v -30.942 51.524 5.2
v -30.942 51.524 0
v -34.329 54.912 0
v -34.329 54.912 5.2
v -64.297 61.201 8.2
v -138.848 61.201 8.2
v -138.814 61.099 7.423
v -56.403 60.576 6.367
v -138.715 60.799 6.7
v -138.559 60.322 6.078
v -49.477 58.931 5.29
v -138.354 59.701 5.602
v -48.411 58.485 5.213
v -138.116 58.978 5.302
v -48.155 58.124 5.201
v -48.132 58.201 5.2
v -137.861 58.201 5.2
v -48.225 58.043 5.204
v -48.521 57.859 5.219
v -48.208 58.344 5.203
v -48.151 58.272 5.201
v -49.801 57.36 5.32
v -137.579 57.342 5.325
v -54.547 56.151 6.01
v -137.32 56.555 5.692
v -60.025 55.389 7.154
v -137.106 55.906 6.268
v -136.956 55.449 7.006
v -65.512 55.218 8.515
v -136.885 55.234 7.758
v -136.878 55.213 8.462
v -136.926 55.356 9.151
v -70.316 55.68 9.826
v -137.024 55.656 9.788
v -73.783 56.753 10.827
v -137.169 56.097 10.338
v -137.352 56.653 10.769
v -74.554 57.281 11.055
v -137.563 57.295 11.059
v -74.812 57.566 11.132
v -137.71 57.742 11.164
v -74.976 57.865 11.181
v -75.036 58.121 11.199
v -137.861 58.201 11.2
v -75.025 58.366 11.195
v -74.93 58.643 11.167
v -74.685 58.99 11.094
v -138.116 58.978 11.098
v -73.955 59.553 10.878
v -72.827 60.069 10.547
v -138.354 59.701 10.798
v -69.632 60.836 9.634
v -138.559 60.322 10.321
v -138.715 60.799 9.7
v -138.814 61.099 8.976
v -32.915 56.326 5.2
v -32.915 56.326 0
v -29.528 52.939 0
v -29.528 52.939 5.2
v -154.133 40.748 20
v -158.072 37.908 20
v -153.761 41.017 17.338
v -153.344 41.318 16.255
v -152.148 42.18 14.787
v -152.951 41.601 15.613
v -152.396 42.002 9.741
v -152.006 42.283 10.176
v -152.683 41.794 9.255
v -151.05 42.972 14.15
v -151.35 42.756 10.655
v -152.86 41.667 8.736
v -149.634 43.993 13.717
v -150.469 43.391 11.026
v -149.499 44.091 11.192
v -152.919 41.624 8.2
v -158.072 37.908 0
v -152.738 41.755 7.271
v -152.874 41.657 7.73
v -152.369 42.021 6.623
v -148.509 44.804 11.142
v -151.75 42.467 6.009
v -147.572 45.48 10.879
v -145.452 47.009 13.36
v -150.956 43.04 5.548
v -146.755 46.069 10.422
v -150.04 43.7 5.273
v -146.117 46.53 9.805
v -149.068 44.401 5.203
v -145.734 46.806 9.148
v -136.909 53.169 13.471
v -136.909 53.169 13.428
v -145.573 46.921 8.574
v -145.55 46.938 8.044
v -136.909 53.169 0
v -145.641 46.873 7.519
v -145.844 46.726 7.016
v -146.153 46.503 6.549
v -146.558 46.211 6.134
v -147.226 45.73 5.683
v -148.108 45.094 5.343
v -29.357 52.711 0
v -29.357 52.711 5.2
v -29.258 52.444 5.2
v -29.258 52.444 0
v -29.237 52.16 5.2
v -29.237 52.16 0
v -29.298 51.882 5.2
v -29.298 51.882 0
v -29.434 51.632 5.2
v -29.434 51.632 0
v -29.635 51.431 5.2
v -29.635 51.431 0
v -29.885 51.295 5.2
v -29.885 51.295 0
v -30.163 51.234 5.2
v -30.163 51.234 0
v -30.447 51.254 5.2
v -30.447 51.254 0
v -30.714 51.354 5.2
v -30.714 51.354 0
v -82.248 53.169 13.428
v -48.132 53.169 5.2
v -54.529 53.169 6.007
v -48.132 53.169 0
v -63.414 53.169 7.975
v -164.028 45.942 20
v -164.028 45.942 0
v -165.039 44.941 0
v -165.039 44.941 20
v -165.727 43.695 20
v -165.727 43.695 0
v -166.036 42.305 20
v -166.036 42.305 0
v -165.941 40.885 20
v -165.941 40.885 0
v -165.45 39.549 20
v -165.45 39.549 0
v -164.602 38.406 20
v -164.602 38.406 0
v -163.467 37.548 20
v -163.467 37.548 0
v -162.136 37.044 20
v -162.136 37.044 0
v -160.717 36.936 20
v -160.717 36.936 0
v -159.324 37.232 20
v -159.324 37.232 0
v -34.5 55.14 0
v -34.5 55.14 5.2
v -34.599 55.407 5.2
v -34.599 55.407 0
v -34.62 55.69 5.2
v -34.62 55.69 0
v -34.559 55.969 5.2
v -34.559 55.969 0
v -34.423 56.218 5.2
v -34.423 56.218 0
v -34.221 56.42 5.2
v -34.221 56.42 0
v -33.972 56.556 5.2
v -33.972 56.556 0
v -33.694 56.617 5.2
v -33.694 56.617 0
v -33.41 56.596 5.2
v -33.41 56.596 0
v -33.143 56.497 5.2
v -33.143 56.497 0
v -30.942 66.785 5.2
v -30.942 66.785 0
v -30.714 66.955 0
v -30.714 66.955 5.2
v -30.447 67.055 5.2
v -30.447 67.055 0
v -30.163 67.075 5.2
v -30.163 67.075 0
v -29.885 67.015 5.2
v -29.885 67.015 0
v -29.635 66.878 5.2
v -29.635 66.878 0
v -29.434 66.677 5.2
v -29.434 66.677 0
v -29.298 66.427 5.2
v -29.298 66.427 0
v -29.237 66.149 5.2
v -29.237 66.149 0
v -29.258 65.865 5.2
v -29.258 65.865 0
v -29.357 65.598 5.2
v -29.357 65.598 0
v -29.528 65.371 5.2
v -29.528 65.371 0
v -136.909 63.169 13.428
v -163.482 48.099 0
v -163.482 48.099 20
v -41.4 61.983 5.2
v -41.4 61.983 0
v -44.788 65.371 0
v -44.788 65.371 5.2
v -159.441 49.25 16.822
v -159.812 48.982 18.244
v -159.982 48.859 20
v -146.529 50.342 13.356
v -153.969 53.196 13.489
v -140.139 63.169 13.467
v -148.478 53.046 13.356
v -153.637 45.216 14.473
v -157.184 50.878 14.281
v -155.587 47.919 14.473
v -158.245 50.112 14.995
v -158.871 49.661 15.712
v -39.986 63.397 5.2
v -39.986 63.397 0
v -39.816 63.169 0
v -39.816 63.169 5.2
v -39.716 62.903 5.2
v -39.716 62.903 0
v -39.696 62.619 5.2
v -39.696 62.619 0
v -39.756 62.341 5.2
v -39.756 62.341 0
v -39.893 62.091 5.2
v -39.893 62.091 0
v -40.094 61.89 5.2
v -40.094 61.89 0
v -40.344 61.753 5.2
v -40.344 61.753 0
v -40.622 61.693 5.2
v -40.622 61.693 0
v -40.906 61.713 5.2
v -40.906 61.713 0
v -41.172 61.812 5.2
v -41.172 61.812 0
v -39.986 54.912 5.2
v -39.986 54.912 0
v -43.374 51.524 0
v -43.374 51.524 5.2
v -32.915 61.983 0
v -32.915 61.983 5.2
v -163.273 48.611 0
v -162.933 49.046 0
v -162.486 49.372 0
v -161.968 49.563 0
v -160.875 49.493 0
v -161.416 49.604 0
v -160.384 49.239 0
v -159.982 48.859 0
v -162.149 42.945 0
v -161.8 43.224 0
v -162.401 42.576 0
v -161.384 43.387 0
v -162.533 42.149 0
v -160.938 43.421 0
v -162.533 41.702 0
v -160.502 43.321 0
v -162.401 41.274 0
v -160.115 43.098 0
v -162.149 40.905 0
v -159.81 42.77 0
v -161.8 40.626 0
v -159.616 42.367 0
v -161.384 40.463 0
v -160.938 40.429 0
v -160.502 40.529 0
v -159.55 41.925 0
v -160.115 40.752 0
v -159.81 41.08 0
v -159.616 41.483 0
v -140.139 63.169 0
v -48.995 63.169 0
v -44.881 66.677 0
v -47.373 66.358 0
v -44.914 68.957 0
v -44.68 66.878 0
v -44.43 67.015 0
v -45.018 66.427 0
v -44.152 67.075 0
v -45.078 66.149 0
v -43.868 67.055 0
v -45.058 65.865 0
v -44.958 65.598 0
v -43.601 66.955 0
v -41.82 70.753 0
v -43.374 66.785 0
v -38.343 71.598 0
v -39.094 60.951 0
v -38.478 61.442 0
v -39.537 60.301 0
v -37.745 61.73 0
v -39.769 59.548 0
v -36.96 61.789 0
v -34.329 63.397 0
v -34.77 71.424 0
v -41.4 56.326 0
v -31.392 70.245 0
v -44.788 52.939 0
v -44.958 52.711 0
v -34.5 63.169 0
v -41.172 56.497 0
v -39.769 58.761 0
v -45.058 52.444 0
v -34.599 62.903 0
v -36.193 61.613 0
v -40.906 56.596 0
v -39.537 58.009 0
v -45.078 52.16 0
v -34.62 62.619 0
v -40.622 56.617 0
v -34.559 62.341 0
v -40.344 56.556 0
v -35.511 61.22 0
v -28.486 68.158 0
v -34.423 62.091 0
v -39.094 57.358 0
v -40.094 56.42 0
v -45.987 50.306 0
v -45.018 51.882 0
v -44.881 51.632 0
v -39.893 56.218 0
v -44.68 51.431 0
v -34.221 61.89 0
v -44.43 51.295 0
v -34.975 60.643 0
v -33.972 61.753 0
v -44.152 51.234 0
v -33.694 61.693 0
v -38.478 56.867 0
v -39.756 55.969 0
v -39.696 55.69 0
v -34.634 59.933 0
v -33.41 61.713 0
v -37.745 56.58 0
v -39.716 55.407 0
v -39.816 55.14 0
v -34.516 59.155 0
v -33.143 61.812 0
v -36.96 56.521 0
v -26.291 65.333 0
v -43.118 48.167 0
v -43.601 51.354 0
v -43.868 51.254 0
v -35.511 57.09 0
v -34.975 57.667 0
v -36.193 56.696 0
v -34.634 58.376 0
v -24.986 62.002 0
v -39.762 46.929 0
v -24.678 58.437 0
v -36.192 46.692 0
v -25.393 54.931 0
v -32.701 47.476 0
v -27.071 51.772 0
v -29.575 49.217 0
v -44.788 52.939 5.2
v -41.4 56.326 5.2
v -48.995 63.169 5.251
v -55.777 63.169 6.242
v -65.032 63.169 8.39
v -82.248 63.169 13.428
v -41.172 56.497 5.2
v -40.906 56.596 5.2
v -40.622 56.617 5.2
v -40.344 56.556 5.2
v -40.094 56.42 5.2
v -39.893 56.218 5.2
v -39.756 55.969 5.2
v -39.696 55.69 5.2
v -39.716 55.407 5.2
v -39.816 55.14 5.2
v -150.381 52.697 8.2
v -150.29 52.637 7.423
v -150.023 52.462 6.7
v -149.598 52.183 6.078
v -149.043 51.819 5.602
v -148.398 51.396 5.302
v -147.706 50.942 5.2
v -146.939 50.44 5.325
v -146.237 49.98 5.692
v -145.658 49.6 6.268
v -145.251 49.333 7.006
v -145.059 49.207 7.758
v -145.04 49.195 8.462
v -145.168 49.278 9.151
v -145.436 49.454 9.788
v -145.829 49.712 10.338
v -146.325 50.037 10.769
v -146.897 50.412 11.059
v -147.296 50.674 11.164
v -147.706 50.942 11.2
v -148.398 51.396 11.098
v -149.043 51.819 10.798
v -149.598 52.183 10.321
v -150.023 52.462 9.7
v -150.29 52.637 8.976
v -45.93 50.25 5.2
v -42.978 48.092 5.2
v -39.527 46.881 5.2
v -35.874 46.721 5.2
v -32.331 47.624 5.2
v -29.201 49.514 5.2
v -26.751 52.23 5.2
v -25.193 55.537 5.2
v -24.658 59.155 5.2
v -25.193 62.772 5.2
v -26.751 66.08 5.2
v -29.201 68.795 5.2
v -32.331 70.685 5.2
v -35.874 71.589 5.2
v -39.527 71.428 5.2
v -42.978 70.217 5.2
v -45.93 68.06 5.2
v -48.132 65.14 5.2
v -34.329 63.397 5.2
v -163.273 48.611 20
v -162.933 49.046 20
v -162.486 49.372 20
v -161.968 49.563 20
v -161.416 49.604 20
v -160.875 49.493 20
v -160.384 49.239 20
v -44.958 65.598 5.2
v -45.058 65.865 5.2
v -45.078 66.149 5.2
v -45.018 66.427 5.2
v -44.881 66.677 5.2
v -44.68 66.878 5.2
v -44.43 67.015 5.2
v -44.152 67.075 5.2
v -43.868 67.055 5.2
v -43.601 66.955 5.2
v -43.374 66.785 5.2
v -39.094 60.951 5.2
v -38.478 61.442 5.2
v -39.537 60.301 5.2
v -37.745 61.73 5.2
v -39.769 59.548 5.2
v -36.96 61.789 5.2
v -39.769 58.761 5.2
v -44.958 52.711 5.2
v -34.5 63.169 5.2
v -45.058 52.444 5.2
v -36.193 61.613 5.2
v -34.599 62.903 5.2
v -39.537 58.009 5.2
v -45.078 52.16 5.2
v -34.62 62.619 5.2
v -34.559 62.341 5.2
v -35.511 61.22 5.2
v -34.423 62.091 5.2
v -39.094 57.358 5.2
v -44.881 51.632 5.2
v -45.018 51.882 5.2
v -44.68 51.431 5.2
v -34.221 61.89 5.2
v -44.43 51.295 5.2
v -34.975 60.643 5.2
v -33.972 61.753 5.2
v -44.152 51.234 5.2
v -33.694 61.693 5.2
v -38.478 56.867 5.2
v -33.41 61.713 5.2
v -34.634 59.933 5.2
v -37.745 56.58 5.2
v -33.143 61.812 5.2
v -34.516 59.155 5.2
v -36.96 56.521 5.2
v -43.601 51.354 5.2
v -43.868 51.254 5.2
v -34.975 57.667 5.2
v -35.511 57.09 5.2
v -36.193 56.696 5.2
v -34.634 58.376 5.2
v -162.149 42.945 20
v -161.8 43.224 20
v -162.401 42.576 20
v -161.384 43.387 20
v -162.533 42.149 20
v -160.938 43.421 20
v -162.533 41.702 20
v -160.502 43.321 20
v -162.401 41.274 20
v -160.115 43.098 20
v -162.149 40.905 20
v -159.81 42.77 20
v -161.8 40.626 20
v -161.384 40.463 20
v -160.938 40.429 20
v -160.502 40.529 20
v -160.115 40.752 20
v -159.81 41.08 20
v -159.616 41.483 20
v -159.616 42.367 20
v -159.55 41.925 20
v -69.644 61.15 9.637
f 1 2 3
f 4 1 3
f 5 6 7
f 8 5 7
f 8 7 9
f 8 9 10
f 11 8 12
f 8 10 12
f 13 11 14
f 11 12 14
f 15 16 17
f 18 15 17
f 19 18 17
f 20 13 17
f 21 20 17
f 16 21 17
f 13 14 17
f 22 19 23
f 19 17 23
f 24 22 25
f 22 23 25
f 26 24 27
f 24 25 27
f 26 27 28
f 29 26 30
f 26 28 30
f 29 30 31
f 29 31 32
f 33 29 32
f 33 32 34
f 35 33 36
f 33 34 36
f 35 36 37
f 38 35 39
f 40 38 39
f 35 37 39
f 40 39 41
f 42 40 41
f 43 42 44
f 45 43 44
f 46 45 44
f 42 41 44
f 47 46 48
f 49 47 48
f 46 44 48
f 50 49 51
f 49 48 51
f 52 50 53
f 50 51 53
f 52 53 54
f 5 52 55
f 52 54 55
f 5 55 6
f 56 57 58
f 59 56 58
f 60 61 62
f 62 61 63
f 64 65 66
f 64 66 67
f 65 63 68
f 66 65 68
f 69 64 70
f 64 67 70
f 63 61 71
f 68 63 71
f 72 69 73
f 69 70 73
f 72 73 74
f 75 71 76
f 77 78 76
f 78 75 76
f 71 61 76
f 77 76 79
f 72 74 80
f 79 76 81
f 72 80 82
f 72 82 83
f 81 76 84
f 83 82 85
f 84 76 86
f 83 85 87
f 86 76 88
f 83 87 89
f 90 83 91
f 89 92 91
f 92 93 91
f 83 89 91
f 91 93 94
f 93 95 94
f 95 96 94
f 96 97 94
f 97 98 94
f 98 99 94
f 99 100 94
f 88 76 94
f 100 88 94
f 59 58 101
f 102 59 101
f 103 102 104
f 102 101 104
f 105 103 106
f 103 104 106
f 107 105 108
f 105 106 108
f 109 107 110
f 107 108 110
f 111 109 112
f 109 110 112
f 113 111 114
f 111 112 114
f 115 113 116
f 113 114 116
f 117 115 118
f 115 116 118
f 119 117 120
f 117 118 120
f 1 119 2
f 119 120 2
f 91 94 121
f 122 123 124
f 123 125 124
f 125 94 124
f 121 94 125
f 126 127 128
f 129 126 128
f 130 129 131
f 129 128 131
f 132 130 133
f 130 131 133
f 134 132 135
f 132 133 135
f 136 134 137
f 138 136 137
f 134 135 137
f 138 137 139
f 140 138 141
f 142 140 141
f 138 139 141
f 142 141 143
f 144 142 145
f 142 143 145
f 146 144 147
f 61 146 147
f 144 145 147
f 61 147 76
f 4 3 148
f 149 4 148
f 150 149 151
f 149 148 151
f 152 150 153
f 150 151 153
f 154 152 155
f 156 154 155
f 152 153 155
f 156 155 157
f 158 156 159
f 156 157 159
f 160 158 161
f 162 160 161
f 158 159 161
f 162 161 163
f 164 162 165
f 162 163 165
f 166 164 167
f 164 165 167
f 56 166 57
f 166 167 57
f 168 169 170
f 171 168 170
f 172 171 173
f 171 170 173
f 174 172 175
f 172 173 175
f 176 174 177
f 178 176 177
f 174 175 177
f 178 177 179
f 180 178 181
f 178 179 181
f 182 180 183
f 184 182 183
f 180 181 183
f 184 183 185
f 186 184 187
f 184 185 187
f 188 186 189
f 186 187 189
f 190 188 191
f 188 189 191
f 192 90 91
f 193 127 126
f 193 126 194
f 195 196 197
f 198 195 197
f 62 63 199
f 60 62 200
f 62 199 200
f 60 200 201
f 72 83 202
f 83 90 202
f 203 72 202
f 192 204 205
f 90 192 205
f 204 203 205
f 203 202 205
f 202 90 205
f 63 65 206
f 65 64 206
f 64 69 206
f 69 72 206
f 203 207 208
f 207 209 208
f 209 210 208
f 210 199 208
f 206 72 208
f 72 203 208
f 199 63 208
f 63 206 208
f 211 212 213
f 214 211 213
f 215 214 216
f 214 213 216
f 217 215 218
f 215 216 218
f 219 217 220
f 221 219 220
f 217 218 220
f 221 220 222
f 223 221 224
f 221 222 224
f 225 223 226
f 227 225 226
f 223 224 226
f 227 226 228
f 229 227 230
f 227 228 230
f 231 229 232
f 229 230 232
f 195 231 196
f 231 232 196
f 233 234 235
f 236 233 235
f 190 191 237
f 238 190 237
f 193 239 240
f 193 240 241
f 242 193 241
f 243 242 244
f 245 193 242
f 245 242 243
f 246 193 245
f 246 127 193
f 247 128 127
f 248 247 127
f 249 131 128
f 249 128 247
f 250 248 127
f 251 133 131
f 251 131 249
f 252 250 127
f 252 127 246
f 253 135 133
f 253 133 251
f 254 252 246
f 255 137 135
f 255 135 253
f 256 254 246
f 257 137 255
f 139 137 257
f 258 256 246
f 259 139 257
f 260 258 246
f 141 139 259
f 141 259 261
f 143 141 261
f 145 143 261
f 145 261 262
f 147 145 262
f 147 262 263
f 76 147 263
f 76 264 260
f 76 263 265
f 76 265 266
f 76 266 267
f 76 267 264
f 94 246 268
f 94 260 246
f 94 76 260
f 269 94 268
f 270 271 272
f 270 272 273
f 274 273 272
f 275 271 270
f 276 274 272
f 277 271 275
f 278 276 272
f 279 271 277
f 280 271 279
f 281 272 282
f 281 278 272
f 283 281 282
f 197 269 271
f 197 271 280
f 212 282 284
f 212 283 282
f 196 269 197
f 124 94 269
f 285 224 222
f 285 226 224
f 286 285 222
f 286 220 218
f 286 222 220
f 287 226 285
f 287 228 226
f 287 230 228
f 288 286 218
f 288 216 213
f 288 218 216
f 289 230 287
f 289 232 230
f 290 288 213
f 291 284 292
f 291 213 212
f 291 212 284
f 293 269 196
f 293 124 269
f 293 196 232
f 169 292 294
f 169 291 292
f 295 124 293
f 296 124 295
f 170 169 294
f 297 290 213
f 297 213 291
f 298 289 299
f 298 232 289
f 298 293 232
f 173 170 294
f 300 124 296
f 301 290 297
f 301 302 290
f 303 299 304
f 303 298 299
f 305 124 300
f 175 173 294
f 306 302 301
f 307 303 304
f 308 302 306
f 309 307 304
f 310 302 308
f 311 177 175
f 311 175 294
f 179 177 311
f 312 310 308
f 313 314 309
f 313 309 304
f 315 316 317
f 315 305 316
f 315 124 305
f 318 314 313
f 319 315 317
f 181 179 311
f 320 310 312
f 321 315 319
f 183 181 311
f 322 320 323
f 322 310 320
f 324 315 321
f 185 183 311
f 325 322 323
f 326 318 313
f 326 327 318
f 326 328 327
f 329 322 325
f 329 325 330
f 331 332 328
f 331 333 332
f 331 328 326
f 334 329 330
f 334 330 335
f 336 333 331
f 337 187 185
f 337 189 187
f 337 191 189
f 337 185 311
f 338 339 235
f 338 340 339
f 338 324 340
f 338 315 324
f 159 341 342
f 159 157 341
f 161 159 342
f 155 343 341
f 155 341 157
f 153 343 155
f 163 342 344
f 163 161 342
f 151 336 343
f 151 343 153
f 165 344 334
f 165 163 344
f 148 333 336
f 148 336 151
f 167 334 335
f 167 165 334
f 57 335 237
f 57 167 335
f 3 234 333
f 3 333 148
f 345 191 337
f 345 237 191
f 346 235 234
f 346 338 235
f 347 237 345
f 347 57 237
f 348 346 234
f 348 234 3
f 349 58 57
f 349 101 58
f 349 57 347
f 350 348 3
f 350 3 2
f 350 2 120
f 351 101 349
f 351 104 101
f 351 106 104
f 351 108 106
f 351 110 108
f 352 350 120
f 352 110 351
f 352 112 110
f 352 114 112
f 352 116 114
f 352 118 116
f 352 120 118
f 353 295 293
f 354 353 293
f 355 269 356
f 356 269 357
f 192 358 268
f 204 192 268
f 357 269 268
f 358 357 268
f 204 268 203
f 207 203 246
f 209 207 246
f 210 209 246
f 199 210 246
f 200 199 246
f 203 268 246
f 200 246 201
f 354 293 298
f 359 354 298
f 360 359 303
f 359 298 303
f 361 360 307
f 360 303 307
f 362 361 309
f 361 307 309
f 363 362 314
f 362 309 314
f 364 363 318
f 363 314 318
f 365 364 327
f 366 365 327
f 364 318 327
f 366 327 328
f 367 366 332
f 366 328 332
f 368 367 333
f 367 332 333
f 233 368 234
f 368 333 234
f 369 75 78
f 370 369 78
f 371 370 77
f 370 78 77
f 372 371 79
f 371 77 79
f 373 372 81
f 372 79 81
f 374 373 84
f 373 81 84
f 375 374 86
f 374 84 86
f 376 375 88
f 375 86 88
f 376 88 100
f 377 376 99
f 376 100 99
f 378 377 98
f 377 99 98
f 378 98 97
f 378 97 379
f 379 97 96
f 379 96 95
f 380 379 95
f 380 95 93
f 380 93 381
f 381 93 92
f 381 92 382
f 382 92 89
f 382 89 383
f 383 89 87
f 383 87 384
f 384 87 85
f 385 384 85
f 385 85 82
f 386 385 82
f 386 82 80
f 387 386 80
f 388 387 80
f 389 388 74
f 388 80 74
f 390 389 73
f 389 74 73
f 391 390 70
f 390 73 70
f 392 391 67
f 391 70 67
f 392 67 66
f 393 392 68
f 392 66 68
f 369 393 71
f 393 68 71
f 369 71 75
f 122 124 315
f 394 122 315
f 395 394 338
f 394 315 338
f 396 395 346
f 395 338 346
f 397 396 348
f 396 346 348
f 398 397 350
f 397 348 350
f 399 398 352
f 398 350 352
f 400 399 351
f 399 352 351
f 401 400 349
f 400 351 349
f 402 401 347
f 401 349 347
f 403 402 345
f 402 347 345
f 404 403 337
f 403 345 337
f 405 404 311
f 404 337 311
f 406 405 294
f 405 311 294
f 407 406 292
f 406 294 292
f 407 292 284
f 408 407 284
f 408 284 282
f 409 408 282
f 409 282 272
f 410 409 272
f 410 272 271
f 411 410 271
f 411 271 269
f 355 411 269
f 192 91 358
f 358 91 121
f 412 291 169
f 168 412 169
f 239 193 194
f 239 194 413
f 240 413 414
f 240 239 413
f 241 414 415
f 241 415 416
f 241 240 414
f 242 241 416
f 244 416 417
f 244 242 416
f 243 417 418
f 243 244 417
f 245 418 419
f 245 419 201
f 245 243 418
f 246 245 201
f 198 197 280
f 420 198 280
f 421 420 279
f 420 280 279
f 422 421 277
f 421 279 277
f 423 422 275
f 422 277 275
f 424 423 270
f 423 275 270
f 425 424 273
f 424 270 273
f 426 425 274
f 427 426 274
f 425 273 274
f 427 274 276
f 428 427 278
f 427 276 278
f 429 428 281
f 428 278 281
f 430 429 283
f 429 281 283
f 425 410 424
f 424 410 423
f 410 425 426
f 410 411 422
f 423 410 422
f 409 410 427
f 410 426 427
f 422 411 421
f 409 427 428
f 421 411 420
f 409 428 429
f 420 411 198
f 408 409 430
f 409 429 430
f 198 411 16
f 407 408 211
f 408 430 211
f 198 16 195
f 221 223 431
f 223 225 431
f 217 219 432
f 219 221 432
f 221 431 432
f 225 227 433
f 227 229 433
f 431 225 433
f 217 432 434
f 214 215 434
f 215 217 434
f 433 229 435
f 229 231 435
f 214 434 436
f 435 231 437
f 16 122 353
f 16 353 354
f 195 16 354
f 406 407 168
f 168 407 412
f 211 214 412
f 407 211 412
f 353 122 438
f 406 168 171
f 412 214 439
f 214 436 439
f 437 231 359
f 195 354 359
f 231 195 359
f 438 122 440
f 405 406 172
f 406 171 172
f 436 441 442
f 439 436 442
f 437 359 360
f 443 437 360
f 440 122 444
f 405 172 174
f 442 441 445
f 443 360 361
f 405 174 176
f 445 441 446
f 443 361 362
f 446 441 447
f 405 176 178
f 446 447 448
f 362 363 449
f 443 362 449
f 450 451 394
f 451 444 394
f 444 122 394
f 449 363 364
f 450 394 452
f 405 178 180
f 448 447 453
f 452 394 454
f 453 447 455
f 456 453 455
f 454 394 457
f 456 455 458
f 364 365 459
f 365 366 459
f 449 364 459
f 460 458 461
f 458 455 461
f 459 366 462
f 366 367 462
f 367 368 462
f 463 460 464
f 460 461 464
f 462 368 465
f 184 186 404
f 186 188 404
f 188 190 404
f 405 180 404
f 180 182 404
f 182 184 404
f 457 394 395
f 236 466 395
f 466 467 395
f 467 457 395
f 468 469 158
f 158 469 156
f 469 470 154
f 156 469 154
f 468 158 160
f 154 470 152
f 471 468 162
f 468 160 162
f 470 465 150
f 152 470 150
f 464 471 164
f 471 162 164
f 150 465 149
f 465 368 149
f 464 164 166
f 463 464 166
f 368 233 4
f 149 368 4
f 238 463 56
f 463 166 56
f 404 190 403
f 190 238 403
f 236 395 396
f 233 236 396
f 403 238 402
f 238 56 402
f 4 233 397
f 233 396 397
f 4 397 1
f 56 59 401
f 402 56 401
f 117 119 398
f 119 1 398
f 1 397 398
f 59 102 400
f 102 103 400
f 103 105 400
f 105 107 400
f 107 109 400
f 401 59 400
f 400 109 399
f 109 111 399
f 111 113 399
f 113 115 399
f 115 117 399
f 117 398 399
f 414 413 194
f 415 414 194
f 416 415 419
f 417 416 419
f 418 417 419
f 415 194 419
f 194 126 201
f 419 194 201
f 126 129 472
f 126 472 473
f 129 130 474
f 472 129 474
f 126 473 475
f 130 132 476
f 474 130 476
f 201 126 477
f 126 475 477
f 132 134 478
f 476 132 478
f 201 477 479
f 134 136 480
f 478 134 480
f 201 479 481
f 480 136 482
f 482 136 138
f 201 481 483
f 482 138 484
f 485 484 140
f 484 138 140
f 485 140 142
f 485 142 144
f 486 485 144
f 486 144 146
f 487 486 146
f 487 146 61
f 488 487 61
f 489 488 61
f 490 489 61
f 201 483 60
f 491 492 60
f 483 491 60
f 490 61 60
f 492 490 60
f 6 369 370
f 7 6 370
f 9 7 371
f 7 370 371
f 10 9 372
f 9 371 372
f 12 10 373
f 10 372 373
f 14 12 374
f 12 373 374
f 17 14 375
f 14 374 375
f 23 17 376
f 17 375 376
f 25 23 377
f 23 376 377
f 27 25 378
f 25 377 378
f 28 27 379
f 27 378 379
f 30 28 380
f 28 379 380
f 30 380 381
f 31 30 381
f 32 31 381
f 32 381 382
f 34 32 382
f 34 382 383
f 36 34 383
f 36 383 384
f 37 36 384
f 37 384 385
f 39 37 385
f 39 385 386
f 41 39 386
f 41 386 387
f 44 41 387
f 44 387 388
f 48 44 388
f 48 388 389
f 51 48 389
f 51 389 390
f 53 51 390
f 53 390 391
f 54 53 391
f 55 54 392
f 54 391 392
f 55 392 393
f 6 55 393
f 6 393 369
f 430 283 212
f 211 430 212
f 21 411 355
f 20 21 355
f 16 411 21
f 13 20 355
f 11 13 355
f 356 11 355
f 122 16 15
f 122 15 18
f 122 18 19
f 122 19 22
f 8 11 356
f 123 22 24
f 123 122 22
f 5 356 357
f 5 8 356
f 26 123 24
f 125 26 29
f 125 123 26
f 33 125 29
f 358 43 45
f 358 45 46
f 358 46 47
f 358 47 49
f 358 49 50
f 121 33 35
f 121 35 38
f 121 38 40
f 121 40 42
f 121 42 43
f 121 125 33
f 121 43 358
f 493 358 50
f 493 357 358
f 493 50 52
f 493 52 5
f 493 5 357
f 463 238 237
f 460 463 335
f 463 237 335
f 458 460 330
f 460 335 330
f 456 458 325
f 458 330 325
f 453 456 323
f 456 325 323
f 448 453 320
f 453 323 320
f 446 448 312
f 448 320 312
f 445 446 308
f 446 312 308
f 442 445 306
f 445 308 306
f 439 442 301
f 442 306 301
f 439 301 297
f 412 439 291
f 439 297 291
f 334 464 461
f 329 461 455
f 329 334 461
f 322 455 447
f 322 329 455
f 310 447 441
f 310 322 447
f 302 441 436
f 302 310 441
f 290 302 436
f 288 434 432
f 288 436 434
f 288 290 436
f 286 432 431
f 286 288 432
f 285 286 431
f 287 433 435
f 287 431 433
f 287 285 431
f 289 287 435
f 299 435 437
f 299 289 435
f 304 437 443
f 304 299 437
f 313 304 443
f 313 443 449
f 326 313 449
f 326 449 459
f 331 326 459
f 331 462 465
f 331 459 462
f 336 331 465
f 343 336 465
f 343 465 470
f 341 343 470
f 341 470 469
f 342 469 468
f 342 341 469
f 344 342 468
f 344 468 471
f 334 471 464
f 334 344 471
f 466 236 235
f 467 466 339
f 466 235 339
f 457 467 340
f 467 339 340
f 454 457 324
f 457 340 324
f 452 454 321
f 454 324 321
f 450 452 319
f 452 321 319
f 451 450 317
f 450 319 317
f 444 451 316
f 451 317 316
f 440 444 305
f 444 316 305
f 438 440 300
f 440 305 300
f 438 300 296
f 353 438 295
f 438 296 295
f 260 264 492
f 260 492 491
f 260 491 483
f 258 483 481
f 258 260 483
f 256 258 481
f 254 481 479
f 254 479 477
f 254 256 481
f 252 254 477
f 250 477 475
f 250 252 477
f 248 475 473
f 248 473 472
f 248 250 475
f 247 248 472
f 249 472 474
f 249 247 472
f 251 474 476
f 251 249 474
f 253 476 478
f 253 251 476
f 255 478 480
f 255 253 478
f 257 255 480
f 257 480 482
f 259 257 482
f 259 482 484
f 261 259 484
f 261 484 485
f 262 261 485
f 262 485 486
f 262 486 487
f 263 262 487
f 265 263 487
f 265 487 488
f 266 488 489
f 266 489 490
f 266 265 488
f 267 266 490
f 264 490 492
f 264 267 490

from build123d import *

# Parameters (mm, degrees)
F0_R          = 1.5
F0_R_2        = 2.6412895019
F1_DEPTH      = 20
F3_DEPTH      = 25
F3_DEPTH_BACK = 25
F5_DEPTH      = 25
F8_R          = 3
F11_DEPTH     = 20
F12_T1_DEPTH  = 41.4280655281


# Not quite as in the source:
# - a fillet or chamfer that OpenCascade refuses, or shapes differently, is made with other operations: its cross-section is extruded or revolved along the edge and cut away or added


with BuildPart() as f1:
    # F0 (on Top) → F1 (new body)
    with BuildSketch(Plane.XY):
        with BuildLine():
            Line((-136.9092201152, 53.1693232265), (-48.1315898414, 53.1693232265))
            ThreePointArc((-48.1315898414, 53.1693232265), (-24.7040865671, 60.2304450376), (-48.9954501741, 63.1693232265))
            Line((-48.9954501741, 63.1693232265), (-140.1388241649, 63.1693232265))
            Line((-140.1388241649, 63.1693232265), (-164.0276092996, 45.9422132412))
            ThreePointArc((-164.0276092996, 45.9422132412), (-165.0669659453, 38.947333564), (-158.0720862682, 37.9079769183))
            Line((-158.0720862682, 37.9079769183), (-136.9092201152, 53.1693232265))
        make_face()
        with Locations((-161.0498477839, 41.9250950797)):
            Circle(F0_R, mode=Mode.SUBTRACT)
        with BuildLine():
            ThreePointArc((-43.3736355328, 51.5244823211), (-44.7878490952, 51.5244823211), (-44.7878490952, 52.9386958835))
            Line((-44.7878490952, 52.9386958835), (-41.4003457692, 56.3261992095))
            ThreePointArc((-41.4003457692, 56.3261992095), (-39.9861322069, 56.3261992095), (-39.9861322069, 54.9119856471))
            Line((-39.9861322069, 54.9119856471), (-43.3736355328, 51.5244823211))
        make_face(mode=Mode.SUBTRACT)
        with BuildLine():
            ThreePointArc((-29.527561069, 52.9386958835), (-29.527561069, 51.5244823211), (-30.9417746314, 51.5244823211))
            Line((-30.9417746314, 51.5244823211), (-34.3292779574, 54.9119856471))
            ThreePointArc((-34.3292779574, 54.9119856471), (-34.3292779574, 56.3261992095), (-32.915064395, 56.3261992095))
            Line((-32.915064395, 56.3261992095), (-29.527561069, 52.9386958835))
        make_face(mode=Mode.SUBTRACT)
        with Locations((-37.1577050821, 59.1546263342)):
            Circle(F0_R_2, mode=Mode.SUBTRACT)
        with BuildLine():
            Line((-41.4003457692, 61.9830534589), (-44.7878490952, 65.3705567849))
            ThreePointArc((-44.7878490952, 65.3705567849), (-44.7878490952, 66.7847703473), (-43.3736355328, 66.7847703473))
            Line((-43.3736355328, 66.7847703473), (-39.9861322069, 63.3972670213))
            ThreePointArc((-39.9861322069, 63.3972670213), (-39.9861322069, 61.9830534589), (-41.4003457692, 61.9830534589))
        make_face(mode=Mode.SUBTRACT)
        with BuildLine():
            ThreePointArc((-30.9417746314, 66.7847703473), (-29.527561069, 66.7847703473), (-29.527561069, 65.3705567849))
            Line((-29.527561069, 65.3705567849), (-32.915064395, 61.9830534589))
            ThreePointArc((-32.915064395, 61.9830534589), (-34.3292779574, 61.9830534589), (-34.3292779574, 63.3972670213))
            Line((-34.3292779574, 63.3972670213), (-30.9417746314, 66.7847703473))
        make_face(mode=Mode.SUBTRACT)
    extrude(amount=F1_DEPTH)

    # F2 (on face) → F3 (cut, two sides)
    with BuildSketch(Plane.XZ.offset(-53.1693232265)) as f3_sk:
        with BuildLine():
            add(Edge.make_bspline(
                [(-48.1315898414, 5.1997262053), (-55.5737955735, 5.517366778), (-70.0693075174, 9.5402547737), (-82.2478533544, 13.4277092293)],
                knots=[0, 0, 0, 0, 32.5655157772, 32.5655157772, 32.5655157772, 32.5655157772], degree=3))
            Line((-48.1315898414, 5.1997262053), (-22.6805435396, 5.1997262053))
            Line((-22.6805435396, 5.1997262053), (-24.4416198375, 23.0218202323))
            Line((-24.4416198375, 23.0218202323), (-102.9450073838, 23.9689107984))
            Line((-102.9450073838, 23.9689107984), (-109.8586171865, 20))
            Line((-109.8586171865, 20), (-136.9092201152, 24.3437178433))
            Line((-136.9092201152, 24.3437178433), (-136.9092201152, 13.4277092293))
            Line((-136.9092201152, 13.4277092293), (-82.2478533544, 13.4277092293))
        make_face()
    extrude(amount=-F3_DEPTH, mode=Mode.SUBTRACT)
    extrude(f3_sk.sketch, amount=F3_DEPTH_BACK, mode=Mode.SUBTRACT)

    # F4 (on face) → F5 (cut)
    with BuildSketch(Plane(origin=(-77.913469167, 108.0423893277, 0), x_dir=(-0.8110964415, -0.5849124402, 0), z_dir=(-0.5849124402, 0.8110964415, 0))):
        with BuildLine():
            Line((73.6283713512, 25.1456971396), (74.0980582459, 13.4277092293))
            add(Edge.make_bspline(
                [(74.0980582459, 13.4277092293), (92.9379910232, 13.834843412), (100.7777675986, 11.1937364563), (101.1828109622, 20)],
                knots=[0, 0, 0, 0, 27.8707523342, 27.8707523342, 27.8707523342, 27.8707523342], degree=3))
            Line((101.1828109622, 20), (97.8787563539, 26.1177145299))
            Line((97.8787563539, 26.1177145299), (73.6283713512, 25.1456971396))
        make_face()
    extrude(amount=-F5_DEPTH, mode=Mode.SUBTRACT)

    # F9: sweep along a path in F6
    with BuildLine(Plane.XY.offset(5.1997262053)) as f9_path:
        Line((-61.2067505717, 58.1693232265), (-86.7135846391, 58.1693232265))
        Line((-86.7135846391, 58.1693232265), (-137.850685735, 58.1693232265))
        Line((-137.850685735, 58.1693232265), (-147.6771980524, 50.9236194193))
        Line((-147.6771980524, 50.9236194193), (-156.9756269455, 10.3533519432))
    # F8 (on face) → F9 (sweep, cut)
    with BuildSketch(Plane.YZ.offset(-48.1315898414)):
        with Locations((58.2011528313, 8.1997262053)):
            Circle(F8_R)
    sweep(path=f9_path.line, transition=Transition.RIGHT, mode=Mode.SUBTRACT)

    # F10 (on face) → F11 (join)
    with BuildSketch(Plane(origin=(0, 0, 0), x_dir=(1, 0, 0), z_dir=(0, 0, -1))):
        Polygon((-159.9824870749, -48.8593044651), (-164.0276092996, -45.9422132412), (-162.4302172451, -52.2535650319), align=None)
    extrude(amount=-F11_DEPTH)

    # F12: fillet of radius 2 on 1 edges, made by hand

    # F12_s2 → F12_t1 (cut)
    with BuildSketch(Plane.XY.offset(-10.7140327641)):
        with BuildLine():
            ThreePointArc((-163.4817415016, 48.0989559734), (-161.9675459982, 49.5626274076), (-159.9824870749, 48.8593044651))
            Line((-159.9824870749, 48.8593044651), (-162.4302172451, 52.2535650319))
            Line((-162.4302172451, 52.2535650319), (-163.4817415016, 48.0989559734))
        make_face()
    extrude(amount=F12_T1_DEPTH, mode=Mode.SUBTRACT)


solid = f1.part
